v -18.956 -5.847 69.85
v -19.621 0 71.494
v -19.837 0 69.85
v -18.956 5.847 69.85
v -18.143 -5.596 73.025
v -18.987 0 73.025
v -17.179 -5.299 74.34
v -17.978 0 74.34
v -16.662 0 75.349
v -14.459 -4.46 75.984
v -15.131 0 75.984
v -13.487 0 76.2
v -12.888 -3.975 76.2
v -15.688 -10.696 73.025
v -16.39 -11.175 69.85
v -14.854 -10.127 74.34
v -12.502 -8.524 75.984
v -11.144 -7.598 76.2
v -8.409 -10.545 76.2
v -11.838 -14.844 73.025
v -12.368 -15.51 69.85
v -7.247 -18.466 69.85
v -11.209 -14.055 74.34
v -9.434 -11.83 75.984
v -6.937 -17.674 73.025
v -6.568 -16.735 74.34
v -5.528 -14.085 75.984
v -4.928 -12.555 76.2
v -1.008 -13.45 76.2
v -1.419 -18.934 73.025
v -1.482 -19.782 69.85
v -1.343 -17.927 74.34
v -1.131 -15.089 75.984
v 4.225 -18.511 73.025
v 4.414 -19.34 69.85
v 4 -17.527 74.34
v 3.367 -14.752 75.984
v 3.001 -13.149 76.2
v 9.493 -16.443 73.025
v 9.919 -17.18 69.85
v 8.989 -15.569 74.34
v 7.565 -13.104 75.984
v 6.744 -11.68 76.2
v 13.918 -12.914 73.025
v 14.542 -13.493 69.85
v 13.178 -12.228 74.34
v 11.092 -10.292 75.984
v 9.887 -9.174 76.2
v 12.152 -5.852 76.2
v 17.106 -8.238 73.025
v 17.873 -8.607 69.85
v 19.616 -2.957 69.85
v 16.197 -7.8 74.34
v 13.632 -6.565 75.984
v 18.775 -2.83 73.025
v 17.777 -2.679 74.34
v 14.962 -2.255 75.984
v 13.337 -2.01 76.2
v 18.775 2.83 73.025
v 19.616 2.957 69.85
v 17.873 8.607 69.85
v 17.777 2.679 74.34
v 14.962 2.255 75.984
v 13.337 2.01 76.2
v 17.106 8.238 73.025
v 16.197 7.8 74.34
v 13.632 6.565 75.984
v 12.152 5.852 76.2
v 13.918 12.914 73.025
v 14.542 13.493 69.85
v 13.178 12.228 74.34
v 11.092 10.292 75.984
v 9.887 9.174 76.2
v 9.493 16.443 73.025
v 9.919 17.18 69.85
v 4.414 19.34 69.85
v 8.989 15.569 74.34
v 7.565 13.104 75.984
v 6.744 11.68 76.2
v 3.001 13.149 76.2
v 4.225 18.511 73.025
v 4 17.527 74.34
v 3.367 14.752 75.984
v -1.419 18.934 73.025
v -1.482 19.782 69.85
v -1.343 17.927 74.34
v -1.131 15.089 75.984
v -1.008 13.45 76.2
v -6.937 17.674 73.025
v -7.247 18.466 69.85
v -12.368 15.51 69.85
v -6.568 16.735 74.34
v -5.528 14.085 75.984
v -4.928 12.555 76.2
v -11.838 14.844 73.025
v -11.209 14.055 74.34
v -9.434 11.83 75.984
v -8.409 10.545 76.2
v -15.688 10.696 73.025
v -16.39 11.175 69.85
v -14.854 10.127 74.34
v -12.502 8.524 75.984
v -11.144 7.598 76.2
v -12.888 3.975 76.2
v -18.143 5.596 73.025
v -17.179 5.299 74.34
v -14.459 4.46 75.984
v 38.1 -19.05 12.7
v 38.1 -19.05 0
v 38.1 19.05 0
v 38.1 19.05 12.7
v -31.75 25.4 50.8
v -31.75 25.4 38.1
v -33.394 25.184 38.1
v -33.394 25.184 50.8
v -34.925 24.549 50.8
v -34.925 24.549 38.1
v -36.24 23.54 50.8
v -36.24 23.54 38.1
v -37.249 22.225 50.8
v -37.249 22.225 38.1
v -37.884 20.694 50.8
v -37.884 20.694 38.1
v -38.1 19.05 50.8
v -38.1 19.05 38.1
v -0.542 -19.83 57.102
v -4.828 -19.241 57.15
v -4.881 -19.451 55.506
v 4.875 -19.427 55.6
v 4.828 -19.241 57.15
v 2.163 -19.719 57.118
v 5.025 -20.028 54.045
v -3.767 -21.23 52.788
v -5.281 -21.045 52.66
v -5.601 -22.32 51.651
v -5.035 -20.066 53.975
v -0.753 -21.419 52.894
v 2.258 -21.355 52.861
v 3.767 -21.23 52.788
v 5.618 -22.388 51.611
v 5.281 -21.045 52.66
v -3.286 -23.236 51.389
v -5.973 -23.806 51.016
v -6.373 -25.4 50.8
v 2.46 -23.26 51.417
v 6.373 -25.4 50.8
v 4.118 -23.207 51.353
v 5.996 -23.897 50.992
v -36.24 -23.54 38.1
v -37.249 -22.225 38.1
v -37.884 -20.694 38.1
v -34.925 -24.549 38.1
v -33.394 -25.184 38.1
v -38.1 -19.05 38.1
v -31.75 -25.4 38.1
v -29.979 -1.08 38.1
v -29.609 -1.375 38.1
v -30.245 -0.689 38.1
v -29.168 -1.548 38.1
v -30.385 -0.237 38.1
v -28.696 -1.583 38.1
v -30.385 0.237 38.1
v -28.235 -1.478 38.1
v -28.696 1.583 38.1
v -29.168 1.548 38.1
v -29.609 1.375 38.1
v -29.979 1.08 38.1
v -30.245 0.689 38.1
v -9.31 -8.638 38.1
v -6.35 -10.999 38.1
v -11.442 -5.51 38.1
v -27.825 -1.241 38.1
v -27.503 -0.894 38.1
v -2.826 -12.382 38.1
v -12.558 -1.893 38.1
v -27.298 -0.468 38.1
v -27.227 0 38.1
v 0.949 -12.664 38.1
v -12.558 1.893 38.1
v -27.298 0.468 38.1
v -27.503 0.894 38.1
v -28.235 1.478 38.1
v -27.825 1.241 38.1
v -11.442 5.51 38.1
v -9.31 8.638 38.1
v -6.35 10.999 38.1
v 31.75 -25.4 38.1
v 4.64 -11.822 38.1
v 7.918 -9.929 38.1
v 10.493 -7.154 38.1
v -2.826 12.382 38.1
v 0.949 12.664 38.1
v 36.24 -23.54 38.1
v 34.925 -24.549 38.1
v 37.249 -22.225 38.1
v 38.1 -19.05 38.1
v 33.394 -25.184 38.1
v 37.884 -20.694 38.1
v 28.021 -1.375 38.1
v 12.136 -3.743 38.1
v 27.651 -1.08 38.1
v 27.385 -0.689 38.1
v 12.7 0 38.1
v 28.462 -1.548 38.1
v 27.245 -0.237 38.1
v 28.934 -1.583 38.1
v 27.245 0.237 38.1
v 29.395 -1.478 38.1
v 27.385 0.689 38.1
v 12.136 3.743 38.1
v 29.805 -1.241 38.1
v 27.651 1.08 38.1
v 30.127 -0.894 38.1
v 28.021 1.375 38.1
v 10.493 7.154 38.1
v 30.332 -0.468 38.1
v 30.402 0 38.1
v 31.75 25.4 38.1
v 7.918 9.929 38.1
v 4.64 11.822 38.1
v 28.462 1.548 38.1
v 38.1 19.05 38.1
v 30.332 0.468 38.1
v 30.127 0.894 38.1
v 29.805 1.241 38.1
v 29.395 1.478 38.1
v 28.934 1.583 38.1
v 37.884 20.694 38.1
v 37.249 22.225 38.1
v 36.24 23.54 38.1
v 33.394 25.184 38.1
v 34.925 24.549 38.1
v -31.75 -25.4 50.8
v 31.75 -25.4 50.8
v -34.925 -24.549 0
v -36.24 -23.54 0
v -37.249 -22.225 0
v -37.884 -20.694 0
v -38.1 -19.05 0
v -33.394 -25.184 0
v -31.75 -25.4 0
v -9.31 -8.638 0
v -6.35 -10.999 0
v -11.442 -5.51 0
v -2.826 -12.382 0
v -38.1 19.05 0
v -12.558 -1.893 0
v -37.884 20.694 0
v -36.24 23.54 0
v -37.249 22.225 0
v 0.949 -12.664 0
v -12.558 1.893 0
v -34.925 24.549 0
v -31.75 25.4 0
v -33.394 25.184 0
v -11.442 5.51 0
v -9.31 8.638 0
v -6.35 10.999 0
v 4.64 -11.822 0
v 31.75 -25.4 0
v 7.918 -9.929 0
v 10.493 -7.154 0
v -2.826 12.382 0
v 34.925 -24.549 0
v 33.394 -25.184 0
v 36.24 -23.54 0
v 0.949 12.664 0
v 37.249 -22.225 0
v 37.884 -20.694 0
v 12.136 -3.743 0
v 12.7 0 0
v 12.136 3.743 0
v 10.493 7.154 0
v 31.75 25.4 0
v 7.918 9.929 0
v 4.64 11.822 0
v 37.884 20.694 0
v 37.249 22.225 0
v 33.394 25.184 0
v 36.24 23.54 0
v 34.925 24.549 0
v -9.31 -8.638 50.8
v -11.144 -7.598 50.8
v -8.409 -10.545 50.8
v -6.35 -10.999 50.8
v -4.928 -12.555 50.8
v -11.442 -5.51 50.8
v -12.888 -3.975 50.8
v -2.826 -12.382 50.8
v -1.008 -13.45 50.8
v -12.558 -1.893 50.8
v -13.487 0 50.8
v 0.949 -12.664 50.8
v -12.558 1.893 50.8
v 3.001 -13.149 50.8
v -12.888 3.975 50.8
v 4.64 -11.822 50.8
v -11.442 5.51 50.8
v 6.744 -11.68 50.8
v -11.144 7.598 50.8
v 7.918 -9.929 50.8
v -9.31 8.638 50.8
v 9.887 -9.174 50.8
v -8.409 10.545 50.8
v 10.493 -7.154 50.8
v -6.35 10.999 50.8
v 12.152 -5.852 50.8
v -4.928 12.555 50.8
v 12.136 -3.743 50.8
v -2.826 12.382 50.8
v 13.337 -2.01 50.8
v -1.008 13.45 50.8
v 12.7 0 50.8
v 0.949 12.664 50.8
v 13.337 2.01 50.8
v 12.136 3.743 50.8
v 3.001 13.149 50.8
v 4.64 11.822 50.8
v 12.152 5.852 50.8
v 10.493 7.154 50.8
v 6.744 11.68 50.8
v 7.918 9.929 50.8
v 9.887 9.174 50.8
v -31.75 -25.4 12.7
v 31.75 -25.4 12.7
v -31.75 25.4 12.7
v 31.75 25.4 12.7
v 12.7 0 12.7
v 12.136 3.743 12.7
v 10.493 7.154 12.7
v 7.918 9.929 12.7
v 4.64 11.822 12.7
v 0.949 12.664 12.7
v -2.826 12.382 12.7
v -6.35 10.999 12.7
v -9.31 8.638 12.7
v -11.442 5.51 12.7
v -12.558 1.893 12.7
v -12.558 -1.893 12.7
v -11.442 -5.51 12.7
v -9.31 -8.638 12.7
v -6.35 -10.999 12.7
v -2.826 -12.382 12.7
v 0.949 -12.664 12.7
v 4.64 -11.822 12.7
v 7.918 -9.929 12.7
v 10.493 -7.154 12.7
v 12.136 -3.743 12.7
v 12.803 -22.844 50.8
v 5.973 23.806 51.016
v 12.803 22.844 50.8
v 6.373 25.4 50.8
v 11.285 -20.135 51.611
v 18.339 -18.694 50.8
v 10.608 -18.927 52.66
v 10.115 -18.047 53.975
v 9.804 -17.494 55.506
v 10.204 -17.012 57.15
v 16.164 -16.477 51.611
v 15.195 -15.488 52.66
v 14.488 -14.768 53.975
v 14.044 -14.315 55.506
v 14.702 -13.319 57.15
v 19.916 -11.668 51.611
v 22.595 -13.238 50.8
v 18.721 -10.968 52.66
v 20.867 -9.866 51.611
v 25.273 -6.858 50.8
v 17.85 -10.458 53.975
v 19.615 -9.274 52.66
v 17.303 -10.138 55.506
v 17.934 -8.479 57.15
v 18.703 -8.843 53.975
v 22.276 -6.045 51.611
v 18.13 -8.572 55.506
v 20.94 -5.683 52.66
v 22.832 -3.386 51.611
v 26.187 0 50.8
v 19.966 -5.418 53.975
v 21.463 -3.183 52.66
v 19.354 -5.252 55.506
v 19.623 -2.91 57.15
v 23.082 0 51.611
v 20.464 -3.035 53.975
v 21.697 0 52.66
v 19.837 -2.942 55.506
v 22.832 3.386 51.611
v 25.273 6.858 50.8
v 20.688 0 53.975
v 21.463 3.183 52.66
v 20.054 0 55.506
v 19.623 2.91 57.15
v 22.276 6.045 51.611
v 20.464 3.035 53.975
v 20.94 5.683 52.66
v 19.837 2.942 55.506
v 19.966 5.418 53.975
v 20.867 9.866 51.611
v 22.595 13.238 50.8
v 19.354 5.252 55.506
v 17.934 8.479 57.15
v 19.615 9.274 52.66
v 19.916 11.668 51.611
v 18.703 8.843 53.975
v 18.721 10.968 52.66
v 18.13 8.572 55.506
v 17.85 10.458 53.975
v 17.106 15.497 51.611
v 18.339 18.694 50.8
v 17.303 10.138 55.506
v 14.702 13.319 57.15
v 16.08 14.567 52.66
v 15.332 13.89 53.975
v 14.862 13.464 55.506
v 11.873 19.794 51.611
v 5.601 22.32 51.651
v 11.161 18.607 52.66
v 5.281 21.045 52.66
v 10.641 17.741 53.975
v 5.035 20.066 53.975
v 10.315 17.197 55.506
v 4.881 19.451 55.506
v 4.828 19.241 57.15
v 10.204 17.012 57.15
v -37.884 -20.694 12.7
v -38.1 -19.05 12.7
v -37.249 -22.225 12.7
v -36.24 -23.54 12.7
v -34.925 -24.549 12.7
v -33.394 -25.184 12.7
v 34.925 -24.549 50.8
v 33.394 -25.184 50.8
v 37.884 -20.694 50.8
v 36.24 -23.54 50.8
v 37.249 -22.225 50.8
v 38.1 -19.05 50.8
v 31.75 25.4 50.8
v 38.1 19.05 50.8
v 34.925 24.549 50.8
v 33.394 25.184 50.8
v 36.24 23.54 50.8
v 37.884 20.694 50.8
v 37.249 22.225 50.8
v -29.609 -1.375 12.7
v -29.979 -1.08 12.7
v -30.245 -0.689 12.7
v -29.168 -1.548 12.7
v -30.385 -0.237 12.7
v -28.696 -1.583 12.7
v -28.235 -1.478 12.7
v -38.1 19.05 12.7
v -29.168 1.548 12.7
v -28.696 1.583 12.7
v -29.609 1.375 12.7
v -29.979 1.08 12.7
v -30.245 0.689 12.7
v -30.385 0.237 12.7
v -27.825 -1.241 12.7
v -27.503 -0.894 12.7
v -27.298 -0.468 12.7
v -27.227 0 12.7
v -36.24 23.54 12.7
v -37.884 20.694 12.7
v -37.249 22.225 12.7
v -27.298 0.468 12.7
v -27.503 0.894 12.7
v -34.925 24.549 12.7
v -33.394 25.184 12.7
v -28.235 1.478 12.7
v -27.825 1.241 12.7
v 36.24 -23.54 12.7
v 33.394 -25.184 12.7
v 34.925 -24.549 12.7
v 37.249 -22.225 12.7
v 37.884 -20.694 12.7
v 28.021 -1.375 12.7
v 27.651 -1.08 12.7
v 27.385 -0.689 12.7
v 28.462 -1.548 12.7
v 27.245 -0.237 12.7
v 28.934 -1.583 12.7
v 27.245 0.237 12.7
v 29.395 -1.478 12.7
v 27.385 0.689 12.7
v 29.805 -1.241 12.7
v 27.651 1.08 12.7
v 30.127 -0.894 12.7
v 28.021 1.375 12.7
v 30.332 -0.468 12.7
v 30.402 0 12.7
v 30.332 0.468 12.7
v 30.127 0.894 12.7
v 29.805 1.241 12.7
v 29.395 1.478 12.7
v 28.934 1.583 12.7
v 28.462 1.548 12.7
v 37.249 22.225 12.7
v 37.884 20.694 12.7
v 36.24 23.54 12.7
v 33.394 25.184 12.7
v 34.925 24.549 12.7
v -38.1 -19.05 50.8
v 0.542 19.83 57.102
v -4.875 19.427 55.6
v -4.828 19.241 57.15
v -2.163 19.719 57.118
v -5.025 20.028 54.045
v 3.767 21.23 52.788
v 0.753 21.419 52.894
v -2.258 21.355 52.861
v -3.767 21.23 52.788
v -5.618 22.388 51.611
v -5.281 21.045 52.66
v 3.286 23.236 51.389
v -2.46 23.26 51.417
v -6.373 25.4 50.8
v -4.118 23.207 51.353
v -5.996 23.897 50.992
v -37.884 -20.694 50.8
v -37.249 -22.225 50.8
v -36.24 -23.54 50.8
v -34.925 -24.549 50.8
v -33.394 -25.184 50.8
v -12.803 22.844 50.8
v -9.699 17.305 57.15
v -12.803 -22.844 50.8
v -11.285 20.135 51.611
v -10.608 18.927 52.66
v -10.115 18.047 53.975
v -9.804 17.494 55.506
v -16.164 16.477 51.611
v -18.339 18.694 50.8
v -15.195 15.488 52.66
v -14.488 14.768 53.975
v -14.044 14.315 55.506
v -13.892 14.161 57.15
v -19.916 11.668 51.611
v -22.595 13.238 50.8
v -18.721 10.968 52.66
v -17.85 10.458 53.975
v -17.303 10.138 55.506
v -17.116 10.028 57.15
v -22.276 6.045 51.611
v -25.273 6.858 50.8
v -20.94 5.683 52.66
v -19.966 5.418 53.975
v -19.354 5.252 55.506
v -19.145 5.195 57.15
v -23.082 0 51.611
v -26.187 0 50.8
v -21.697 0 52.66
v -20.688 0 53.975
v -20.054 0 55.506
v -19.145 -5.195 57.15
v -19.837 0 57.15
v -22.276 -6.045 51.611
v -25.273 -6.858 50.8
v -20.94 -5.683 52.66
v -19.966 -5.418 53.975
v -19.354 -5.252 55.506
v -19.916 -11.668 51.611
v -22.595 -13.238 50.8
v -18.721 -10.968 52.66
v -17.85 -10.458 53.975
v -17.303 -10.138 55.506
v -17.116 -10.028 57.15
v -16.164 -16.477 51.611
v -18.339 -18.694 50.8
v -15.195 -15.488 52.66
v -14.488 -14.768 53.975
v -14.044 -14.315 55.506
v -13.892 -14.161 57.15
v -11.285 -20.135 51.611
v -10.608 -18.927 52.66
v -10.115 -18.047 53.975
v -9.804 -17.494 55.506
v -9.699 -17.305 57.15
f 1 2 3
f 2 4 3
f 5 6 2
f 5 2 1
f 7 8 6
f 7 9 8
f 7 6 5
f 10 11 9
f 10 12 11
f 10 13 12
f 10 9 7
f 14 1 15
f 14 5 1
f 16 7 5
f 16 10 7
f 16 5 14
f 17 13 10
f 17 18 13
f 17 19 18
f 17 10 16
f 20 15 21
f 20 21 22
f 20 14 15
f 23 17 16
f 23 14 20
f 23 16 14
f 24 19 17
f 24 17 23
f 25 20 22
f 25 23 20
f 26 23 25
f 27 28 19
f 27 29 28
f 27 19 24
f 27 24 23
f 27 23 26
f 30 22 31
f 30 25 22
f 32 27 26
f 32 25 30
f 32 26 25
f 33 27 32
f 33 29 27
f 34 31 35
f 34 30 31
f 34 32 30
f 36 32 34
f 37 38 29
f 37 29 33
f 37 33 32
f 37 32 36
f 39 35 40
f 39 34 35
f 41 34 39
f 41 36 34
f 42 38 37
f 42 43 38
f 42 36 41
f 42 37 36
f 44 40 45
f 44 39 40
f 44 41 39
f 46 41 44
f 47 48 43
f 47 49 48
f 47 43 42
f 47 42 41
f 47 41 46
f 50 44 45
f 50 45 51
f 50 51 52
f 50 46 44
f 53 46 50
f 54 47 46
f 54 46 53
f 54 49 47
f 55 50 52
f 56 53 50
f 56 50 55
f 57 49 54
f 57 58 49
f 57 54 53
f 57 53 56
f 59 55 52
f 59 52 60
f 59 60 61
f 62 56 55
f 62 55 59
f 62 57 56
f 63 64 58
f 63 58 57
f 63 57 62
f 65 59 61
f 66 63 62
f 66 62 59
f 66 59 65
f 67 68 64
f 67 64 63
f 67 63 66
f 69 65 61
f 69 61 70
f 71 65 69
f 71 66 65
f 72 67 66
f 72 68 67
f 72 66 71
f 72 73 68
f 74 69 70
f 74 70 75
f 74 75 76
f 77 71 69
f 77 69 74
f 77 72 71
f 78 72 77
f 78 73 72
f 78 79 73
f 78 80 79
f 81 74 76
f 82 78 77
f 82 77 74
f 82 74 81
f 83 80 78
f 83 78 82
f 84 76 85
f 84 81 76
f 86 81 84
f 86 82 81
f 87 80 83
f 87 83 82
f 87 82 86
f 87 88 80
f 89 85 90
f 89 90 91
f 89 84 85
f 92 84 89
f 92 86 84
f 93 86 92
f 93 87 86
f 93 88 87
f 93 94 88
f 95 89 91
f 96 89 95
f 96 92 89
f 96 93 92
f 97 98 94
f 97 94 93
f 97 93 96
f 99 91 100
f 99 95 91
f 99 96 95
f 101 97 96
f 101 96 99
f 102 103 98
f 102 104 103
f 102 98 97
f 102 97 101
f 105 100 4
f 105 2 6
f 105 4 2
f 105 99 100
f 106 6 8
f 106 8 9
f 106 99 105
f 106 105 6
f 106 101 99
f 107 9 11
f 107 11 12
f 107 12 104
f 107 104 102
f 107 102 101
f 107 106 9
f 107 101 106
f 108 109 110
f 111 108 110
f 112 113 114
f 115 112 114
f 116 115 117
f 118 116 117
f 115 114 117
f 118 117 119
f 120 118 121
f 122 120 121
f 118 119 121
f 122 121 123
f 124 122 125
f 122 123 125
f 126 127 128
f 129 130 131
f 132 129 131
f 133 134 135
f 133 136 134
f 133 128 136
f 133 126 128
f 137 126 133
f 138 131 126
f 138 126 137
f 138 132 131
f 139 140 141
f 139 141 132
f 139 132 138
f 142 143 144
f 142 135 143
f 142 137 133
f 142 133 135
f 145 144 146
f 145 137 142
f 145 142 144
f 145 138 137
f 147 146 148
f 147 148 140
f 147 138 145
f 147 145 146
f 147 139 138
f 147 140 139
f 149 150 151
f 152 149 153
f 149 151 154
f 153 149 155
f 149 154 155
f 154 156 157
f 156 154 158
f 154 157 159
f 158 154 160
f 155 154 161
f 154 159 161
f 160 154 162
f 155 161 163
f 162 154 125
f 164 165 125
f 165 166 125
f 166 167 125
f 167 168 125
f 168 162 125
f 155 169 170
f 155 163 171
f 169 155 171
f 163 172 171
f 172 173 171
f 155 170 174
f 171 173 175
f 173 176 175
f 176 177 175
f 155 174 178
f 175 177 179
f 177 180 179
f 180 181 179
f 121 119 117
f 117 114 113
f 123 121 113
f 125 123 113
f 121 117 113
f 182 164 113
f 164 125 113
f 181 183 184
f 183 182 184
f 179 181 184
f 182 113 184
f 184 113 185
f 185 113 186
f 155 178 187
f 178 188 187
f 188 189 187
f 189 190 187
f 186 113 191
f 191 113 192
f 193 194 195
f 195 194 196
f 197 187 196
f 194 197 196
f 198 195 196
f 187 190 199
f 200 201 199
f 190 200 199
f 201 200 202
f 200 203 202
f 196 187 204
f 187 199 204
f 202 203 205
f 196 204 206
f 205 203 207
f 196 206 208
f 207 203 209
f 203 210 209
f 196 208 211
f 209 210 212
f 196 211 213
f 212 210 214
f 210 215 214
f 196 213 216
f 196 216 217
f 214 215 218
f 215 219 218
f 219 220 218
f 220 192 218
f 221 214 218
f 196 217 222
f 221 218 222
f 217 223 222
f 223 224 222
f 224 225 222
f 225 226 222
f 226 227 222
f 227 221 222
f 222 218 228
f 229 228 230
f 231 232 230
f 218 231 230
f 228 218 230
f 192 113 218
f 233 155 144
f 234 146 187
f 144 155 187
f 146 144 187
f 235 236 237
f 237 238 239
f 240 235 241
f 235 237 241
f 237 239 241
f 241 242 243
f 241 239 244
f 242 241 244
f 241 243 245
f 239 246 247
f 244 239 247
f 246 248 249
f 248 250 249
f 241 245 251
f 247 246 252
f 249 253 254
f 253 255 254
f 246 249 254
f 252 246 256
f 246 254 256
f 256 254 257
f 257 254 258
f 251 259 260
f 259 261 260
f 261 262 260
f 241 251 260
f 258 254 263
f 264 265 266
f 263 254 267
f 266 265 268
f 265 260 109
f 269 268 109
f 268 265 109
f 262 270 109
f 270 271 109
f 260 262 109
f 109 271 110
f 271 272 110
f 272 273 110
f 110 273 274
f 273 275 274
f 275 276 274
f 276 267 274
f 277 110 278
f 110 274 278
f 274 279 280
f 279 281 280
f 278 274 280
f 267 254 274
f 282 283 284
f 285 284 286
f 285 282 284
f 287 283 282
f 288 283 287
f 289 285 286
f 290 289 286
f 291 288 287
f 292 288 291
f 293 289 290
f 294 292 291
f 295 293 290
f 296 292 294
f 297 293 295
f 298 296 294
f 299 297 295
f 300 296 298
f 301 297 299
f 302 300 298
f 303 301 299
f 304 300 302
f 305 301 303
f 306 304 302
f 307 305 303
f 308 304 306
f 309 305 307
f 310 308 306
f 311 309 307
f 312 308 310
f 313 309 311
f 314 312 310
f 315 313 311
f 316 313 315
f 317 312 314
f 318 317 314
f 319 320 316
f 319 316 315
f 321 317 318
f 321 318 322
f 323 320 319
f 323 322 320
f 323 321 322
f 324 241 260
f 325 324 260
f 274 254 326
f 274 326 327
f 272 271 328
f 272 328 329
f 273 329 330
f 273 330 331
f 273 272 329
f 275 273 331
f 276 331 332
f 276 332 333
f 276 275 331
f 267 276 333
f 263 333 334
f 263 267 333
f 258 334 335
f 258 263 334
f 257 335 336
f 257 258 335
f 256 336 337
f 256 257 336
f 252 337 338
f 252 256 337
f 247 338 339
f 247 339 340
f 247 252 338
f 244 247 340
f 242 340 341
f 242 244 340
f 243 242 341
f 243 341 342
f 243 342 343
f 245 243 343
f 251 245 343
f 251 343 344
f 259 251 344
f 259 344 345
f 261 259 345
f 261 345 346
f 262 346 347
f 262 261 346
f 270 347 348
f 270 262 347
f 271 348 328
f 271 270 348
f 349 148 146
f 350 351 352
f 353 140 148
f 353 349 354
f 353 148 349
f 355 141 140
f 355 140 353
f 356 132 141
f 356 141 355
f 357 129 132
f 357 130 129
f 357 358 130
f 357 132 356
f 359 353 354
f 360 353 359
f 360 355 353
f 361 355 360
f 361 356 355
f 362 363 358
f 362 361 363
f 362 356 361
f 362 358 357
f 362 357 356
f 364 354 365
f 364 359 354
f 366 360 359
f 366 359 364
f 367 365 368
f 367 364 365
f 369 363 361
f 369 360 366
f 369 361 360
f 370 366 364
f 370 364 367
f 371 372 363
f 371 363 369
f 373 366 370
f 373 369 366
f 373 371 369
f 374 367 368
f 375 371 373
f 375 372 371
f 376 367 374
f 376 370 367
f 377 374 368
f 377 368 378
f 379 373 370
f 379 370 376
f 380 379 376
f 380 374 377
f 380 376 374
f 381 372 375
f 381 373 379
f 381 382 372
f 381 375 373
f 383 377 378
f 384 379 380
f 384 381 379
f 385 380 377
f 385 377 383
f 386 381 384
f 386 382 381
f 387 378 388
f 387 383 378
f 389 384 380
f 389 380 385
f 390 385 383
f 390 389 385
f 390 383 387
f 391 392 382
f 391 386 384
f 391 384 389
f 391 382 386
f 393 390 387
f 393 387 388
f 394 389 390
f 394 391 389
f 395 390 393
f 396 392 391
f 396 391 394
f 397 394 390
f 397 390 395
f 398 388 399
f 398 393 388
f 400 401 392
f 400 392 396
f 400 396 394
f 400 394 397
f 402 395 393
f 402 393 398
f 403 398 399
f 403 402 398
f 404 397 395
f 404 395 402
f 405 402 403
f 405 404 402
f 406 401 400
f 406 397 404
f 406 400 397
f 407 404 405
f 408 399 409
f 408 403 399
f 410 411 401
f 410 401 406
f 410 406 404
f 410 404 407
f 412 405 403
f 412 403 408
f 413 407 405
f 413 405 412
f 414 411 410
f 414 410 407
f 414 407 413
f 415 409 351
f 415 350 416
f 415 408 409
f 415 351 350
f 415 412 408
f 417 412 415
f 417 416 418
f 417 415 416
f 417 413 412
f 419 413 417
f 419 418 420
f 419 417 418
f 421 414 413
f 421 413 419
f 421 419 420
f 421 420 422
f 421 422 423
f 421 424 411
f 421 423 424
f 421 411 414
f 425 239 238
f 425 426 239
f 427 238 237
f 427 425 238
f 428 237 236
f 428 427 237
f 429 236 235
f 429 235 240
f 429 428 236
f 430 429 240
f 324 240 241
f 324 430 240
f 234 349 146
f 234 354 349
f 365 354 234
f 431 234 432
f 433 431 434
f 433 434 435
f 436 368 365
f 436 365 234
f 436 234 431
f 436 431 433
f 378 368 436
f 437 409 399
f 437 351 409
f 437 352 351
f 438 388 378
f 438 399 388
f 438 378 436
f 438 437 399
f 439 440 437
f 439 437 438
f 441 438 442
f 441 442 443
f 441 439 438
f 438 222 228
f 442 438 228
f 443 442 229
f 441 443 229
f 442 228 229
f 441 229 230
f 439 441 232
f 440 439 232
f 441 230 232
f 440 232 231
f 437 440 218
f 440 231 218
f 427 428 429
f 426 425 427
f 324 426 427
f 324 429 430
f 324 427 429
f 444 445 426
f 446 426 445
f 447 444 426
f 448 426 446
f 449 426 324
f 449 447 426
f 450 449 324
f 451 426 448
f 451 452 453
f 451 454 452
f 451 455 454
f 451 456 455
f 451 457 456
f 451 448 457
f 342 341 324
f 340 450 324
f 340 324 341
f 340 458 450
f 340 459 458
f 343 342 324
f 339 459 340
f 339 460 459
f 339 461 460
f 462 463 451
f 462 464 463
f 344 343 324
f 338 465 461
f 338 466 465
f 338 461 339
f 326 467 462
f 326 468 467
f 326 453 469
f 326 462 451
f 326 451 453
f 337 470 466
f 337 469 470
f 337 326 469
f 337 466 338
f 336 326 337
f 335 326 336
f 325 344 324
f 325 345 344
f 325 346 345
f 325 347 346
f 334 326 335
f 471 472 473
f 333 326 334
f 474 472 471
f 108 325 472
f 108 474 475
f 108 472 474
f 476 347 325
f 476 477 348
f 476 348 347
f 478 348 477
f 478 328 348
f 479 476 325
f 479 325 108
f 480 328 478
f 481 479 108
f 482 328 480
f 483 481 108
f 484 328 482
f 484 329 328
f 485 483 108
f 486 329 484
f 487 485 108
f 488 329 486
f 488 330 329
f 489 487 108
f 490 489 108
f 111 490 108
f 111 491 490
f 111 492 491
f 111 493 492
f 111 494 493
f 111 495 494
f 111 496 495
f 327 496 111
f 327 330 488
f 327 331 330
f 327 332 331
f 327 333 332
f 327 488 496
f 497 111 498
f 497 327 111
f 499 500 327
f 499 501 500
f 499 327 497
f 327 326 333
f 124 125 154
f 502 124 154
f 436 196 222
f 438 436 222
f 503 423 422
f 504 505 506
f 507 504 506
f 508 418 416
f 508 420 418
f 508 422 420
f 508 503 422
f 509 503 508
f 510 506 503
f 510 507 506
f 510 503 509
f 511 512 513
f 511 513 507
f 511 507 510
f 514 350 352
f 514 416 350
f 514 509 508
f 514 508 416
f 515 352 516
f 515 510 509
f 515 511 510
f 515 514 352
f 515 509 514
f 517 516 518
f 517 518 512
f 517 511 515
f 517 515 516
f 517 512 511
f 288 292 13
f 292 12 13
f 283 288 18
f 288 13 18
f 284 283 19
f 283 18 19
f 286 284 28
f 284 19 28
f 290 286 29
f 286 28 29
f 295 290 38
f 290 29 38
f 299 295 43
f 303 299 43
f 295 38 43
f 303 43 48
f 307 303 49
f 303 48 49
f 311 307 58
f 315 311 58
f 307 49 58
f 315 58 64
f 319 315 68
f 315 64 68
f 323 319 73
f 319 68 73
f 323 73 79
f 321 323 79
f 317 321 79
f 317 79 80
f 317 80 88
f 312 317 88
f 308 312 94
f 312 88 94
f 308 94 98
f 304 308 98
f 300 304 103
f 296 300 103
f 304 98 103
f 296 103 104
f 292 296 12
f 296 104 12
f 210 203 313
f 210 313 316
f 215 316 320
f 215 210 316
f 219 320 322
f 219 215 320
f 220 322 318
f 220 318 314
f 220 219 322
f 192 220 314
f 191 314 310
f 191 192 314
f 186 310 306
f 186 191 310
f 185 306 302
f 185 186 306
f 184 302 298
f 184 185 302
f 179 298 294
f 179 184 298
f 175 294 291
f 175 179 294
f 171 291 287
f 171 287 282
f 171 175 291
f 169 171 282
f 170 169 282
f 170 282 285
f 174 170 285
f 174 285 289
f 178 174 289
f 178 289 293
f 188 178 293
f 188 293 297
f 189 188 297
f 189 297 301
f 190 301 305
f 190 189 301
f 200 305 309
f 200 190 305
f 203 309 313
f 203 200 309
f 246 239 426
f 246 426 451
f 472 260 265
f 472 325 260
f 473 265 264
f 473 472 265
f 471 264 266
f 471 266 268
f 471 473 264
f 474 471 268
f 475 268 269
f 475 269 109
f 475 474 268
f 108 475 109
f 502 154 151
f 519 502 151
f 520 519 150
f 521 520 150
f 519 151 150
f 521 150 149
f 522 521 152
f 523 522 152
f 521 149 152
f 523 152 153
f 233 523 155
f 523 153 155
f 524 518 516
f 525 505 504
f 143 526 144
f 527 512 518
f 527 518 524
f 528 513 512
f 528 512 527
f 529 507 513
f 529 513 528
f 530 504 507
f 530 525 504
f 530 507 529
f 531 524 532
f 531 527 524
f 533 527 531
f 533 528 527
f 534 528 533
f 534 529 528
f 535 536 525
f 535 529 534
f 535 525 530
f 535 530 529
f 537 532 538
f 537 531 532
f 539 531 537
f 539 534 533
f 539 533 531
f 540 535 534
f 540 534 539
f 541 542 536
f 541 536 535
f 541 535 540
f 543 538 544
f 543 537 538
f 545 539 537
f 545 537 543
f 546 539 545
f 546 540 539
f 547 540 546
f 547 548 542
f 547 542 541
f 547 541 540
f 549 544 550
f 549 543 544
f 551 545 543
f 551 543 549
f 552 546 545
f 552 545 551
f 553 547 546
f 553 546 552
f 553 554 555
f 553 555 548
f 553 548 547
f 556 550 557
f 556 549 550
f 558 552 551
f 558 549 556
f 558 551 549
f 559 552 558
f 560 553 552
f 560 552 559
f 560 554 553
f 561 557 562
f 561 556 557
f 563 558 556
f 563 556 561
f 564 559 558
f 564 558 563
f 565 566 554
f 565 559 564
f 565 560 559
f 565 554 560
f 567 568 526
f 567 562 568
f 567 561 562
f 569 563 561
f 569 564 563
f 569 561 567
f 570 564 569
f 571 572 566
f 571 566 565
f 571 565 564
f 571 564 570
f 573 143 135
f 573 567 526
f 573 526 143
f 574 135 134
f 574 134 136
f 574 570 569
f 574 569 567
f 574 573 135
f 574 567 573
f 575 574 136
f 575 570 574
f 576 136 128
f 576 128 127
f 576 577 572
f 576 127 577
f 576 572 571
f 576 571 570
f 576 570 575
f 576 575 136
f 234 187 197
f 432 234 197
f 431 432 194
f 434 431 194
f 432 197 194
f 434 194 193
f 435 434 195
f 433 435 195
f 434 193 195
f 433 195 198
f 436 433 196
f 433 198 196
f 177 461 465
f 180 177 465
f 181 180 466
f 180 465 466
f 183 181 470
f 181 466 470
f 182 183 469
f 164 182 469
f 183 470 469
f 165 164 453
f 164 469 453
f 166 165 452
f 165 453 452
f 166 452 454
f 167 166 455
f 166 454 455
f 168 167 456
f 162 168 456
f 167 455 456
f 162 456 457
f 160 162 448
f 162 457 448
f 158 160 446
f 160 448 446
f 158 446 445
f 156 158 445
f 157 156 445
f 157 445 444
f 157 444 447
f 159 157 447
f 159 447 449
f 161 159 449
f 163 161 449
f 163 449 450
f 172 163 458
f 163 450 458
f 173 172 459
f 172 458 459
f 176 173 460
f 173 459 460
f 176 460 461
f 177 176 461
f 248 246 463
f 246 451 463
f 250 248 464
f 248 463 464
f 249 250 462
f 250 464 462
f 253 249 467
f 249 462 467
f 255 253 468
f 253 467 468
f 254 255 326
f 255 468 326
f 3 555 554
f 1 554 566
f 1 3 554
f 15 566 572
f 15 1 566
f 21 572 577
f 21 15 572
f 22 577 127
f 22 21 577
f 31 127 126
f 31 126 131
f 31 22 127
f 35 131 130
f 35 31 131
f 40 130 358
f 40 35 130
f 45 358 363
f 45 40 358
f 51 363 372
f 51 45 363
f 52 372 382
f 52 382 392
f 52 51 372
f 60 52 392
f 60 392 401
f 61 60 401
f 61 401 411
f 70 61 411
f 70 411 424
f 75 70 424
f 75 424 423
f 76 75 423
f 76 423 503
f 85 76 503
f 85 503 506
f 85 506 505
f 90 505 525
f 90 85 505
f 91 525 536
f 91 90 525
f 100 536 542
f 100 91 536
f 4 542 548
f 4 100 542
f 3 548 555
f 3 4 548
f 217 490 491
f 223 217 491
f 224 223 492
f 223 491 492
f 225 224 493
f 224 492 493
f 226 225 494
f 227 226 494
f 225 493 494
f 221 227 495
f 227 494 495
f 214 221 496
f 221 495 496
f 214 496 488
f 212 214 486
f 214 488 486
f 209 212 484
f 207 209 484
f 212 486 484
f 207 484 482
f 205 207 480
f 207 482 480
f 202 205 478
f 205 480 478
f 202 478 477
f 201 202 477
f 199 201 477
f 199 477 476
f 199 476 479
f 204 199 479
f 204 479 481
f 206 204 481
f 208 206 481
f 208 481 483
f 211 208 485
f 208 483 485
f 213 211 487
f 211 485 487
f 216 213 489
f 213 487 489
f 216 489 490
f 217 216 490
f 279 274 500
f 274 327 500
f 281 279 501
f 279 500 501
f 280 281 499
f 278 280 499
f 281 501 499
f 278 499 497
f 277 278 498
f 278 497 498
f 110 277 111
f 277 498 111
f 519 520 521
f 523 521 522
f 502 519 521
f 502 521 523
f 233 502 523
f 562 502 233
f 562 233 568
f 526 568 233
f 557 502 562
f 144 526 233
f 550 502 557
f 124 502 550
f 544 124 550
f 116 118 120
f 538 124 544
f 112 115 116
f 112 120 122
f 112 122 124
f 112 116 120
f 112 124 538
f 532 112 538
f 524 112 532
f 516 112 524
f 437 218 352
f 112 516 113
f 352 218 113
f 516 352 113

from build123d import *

# Parameters (mm, degrees)
F0_W     = 76.2
F0_H     = 50.8
F0_R     = 12.7
F1_DEPTH = 12.7
F2_R     = 6.35
F3_R     = 1.5875
F4_DEPTH = 25.4
F5_R     = 12.7
F6_DEPTH = 12.7
F7_W     = 6.35
F7_H     = 25.4
F9_R     = 6.34999


# Not quite as in the source:
# - a fillet or chamfer is up to 0.001 mm smaller than in the source, because OpenCascade refuses the exact size


with BuildPart() as f1:
    # F0 (on Top) → F1 (new body)
    with BuildSketch(Plane.XY):
        Rectangle(F0_W, F0_H)
        Circle(F0_R, mode=Mode.SUBTRACT)
    extrude(amount=F1_DEPTH)

    # F2
    f2_edges = [f1.edges().sort_by_distance(p)[0] for p in [
        (38.1, -25.4, 6.35),
        (38.1, 25.4, 6.35),
        (-38.1, -25.4, 6.35),
        (-38.1, 25.4, 6.35),
    ]]
    fillet(f2_edges, radius=F2_R)

    # F3 (on face) → F4 (join)
    with BuildSketch(Plane.XY.offset(12.7)):
        with Locations((-28.8149718722, 0)):
            Circle(F3_R)
        with Locations((28.8149718722, 0)):
            Circle(F3_R)
    extrude(amount=F4_DEPTH)

    # F5 (on face) → F6 (join)
    with BuildSketch(Plane.XY.offset(38.1)):
        with BuildLine():
            Line((-38.1, 19.05), (-38.1, -19.05))
            ThreePointArc((-38.1, -19.05), (-36.2401280605, -23.5401280605), (-31.75, -25.4))
            Line((-31.75, -25.4), (31.75, -25.4))
            ThreePointArc((31.75, -25.4), (36.2401280605, -23.5401280605), (38.1, -19.05))
            Line((38.1, -19.05), (38.1, 19.05))
            ThreePointArc((38.1, 19.05), (36.2401280605, 23.5401280605), (31.75, 25.4))
            Line((31.75, 25.4), (-31.75, 25.4))
            ThreePointArc((-31.75, 25.4), (-36.2401280605, 23.5401280605), (-38.1, 19.05))
        make_face()
        Circle(F5_R, mode=Mode.SUBTRACT)
    extrude(amount=F6_DEPTH)

    # F7 (on Front) → F8 (revolve)
    with BuildSketch(Plane.XZ):
        with Locations((-16.6624, 63.5)):
            Rectangle(F7_W, F7_H)
    revolve(axis=Axis((0, 0, 40.5965745449), (0, 0, 1)))

    # F9 (radius 6.35 in the source; OpenCascade refuses exactly that, so slightly less here)
    f9_edges = [f1.edges().sort_by_distance(p)[0] for p in [
        (19.8374, 0, 76.2),
        (19.8374, 0, 50.8),
    ]]
    fillet(f9_edges, radius=F9_R)


solid = f1.part
